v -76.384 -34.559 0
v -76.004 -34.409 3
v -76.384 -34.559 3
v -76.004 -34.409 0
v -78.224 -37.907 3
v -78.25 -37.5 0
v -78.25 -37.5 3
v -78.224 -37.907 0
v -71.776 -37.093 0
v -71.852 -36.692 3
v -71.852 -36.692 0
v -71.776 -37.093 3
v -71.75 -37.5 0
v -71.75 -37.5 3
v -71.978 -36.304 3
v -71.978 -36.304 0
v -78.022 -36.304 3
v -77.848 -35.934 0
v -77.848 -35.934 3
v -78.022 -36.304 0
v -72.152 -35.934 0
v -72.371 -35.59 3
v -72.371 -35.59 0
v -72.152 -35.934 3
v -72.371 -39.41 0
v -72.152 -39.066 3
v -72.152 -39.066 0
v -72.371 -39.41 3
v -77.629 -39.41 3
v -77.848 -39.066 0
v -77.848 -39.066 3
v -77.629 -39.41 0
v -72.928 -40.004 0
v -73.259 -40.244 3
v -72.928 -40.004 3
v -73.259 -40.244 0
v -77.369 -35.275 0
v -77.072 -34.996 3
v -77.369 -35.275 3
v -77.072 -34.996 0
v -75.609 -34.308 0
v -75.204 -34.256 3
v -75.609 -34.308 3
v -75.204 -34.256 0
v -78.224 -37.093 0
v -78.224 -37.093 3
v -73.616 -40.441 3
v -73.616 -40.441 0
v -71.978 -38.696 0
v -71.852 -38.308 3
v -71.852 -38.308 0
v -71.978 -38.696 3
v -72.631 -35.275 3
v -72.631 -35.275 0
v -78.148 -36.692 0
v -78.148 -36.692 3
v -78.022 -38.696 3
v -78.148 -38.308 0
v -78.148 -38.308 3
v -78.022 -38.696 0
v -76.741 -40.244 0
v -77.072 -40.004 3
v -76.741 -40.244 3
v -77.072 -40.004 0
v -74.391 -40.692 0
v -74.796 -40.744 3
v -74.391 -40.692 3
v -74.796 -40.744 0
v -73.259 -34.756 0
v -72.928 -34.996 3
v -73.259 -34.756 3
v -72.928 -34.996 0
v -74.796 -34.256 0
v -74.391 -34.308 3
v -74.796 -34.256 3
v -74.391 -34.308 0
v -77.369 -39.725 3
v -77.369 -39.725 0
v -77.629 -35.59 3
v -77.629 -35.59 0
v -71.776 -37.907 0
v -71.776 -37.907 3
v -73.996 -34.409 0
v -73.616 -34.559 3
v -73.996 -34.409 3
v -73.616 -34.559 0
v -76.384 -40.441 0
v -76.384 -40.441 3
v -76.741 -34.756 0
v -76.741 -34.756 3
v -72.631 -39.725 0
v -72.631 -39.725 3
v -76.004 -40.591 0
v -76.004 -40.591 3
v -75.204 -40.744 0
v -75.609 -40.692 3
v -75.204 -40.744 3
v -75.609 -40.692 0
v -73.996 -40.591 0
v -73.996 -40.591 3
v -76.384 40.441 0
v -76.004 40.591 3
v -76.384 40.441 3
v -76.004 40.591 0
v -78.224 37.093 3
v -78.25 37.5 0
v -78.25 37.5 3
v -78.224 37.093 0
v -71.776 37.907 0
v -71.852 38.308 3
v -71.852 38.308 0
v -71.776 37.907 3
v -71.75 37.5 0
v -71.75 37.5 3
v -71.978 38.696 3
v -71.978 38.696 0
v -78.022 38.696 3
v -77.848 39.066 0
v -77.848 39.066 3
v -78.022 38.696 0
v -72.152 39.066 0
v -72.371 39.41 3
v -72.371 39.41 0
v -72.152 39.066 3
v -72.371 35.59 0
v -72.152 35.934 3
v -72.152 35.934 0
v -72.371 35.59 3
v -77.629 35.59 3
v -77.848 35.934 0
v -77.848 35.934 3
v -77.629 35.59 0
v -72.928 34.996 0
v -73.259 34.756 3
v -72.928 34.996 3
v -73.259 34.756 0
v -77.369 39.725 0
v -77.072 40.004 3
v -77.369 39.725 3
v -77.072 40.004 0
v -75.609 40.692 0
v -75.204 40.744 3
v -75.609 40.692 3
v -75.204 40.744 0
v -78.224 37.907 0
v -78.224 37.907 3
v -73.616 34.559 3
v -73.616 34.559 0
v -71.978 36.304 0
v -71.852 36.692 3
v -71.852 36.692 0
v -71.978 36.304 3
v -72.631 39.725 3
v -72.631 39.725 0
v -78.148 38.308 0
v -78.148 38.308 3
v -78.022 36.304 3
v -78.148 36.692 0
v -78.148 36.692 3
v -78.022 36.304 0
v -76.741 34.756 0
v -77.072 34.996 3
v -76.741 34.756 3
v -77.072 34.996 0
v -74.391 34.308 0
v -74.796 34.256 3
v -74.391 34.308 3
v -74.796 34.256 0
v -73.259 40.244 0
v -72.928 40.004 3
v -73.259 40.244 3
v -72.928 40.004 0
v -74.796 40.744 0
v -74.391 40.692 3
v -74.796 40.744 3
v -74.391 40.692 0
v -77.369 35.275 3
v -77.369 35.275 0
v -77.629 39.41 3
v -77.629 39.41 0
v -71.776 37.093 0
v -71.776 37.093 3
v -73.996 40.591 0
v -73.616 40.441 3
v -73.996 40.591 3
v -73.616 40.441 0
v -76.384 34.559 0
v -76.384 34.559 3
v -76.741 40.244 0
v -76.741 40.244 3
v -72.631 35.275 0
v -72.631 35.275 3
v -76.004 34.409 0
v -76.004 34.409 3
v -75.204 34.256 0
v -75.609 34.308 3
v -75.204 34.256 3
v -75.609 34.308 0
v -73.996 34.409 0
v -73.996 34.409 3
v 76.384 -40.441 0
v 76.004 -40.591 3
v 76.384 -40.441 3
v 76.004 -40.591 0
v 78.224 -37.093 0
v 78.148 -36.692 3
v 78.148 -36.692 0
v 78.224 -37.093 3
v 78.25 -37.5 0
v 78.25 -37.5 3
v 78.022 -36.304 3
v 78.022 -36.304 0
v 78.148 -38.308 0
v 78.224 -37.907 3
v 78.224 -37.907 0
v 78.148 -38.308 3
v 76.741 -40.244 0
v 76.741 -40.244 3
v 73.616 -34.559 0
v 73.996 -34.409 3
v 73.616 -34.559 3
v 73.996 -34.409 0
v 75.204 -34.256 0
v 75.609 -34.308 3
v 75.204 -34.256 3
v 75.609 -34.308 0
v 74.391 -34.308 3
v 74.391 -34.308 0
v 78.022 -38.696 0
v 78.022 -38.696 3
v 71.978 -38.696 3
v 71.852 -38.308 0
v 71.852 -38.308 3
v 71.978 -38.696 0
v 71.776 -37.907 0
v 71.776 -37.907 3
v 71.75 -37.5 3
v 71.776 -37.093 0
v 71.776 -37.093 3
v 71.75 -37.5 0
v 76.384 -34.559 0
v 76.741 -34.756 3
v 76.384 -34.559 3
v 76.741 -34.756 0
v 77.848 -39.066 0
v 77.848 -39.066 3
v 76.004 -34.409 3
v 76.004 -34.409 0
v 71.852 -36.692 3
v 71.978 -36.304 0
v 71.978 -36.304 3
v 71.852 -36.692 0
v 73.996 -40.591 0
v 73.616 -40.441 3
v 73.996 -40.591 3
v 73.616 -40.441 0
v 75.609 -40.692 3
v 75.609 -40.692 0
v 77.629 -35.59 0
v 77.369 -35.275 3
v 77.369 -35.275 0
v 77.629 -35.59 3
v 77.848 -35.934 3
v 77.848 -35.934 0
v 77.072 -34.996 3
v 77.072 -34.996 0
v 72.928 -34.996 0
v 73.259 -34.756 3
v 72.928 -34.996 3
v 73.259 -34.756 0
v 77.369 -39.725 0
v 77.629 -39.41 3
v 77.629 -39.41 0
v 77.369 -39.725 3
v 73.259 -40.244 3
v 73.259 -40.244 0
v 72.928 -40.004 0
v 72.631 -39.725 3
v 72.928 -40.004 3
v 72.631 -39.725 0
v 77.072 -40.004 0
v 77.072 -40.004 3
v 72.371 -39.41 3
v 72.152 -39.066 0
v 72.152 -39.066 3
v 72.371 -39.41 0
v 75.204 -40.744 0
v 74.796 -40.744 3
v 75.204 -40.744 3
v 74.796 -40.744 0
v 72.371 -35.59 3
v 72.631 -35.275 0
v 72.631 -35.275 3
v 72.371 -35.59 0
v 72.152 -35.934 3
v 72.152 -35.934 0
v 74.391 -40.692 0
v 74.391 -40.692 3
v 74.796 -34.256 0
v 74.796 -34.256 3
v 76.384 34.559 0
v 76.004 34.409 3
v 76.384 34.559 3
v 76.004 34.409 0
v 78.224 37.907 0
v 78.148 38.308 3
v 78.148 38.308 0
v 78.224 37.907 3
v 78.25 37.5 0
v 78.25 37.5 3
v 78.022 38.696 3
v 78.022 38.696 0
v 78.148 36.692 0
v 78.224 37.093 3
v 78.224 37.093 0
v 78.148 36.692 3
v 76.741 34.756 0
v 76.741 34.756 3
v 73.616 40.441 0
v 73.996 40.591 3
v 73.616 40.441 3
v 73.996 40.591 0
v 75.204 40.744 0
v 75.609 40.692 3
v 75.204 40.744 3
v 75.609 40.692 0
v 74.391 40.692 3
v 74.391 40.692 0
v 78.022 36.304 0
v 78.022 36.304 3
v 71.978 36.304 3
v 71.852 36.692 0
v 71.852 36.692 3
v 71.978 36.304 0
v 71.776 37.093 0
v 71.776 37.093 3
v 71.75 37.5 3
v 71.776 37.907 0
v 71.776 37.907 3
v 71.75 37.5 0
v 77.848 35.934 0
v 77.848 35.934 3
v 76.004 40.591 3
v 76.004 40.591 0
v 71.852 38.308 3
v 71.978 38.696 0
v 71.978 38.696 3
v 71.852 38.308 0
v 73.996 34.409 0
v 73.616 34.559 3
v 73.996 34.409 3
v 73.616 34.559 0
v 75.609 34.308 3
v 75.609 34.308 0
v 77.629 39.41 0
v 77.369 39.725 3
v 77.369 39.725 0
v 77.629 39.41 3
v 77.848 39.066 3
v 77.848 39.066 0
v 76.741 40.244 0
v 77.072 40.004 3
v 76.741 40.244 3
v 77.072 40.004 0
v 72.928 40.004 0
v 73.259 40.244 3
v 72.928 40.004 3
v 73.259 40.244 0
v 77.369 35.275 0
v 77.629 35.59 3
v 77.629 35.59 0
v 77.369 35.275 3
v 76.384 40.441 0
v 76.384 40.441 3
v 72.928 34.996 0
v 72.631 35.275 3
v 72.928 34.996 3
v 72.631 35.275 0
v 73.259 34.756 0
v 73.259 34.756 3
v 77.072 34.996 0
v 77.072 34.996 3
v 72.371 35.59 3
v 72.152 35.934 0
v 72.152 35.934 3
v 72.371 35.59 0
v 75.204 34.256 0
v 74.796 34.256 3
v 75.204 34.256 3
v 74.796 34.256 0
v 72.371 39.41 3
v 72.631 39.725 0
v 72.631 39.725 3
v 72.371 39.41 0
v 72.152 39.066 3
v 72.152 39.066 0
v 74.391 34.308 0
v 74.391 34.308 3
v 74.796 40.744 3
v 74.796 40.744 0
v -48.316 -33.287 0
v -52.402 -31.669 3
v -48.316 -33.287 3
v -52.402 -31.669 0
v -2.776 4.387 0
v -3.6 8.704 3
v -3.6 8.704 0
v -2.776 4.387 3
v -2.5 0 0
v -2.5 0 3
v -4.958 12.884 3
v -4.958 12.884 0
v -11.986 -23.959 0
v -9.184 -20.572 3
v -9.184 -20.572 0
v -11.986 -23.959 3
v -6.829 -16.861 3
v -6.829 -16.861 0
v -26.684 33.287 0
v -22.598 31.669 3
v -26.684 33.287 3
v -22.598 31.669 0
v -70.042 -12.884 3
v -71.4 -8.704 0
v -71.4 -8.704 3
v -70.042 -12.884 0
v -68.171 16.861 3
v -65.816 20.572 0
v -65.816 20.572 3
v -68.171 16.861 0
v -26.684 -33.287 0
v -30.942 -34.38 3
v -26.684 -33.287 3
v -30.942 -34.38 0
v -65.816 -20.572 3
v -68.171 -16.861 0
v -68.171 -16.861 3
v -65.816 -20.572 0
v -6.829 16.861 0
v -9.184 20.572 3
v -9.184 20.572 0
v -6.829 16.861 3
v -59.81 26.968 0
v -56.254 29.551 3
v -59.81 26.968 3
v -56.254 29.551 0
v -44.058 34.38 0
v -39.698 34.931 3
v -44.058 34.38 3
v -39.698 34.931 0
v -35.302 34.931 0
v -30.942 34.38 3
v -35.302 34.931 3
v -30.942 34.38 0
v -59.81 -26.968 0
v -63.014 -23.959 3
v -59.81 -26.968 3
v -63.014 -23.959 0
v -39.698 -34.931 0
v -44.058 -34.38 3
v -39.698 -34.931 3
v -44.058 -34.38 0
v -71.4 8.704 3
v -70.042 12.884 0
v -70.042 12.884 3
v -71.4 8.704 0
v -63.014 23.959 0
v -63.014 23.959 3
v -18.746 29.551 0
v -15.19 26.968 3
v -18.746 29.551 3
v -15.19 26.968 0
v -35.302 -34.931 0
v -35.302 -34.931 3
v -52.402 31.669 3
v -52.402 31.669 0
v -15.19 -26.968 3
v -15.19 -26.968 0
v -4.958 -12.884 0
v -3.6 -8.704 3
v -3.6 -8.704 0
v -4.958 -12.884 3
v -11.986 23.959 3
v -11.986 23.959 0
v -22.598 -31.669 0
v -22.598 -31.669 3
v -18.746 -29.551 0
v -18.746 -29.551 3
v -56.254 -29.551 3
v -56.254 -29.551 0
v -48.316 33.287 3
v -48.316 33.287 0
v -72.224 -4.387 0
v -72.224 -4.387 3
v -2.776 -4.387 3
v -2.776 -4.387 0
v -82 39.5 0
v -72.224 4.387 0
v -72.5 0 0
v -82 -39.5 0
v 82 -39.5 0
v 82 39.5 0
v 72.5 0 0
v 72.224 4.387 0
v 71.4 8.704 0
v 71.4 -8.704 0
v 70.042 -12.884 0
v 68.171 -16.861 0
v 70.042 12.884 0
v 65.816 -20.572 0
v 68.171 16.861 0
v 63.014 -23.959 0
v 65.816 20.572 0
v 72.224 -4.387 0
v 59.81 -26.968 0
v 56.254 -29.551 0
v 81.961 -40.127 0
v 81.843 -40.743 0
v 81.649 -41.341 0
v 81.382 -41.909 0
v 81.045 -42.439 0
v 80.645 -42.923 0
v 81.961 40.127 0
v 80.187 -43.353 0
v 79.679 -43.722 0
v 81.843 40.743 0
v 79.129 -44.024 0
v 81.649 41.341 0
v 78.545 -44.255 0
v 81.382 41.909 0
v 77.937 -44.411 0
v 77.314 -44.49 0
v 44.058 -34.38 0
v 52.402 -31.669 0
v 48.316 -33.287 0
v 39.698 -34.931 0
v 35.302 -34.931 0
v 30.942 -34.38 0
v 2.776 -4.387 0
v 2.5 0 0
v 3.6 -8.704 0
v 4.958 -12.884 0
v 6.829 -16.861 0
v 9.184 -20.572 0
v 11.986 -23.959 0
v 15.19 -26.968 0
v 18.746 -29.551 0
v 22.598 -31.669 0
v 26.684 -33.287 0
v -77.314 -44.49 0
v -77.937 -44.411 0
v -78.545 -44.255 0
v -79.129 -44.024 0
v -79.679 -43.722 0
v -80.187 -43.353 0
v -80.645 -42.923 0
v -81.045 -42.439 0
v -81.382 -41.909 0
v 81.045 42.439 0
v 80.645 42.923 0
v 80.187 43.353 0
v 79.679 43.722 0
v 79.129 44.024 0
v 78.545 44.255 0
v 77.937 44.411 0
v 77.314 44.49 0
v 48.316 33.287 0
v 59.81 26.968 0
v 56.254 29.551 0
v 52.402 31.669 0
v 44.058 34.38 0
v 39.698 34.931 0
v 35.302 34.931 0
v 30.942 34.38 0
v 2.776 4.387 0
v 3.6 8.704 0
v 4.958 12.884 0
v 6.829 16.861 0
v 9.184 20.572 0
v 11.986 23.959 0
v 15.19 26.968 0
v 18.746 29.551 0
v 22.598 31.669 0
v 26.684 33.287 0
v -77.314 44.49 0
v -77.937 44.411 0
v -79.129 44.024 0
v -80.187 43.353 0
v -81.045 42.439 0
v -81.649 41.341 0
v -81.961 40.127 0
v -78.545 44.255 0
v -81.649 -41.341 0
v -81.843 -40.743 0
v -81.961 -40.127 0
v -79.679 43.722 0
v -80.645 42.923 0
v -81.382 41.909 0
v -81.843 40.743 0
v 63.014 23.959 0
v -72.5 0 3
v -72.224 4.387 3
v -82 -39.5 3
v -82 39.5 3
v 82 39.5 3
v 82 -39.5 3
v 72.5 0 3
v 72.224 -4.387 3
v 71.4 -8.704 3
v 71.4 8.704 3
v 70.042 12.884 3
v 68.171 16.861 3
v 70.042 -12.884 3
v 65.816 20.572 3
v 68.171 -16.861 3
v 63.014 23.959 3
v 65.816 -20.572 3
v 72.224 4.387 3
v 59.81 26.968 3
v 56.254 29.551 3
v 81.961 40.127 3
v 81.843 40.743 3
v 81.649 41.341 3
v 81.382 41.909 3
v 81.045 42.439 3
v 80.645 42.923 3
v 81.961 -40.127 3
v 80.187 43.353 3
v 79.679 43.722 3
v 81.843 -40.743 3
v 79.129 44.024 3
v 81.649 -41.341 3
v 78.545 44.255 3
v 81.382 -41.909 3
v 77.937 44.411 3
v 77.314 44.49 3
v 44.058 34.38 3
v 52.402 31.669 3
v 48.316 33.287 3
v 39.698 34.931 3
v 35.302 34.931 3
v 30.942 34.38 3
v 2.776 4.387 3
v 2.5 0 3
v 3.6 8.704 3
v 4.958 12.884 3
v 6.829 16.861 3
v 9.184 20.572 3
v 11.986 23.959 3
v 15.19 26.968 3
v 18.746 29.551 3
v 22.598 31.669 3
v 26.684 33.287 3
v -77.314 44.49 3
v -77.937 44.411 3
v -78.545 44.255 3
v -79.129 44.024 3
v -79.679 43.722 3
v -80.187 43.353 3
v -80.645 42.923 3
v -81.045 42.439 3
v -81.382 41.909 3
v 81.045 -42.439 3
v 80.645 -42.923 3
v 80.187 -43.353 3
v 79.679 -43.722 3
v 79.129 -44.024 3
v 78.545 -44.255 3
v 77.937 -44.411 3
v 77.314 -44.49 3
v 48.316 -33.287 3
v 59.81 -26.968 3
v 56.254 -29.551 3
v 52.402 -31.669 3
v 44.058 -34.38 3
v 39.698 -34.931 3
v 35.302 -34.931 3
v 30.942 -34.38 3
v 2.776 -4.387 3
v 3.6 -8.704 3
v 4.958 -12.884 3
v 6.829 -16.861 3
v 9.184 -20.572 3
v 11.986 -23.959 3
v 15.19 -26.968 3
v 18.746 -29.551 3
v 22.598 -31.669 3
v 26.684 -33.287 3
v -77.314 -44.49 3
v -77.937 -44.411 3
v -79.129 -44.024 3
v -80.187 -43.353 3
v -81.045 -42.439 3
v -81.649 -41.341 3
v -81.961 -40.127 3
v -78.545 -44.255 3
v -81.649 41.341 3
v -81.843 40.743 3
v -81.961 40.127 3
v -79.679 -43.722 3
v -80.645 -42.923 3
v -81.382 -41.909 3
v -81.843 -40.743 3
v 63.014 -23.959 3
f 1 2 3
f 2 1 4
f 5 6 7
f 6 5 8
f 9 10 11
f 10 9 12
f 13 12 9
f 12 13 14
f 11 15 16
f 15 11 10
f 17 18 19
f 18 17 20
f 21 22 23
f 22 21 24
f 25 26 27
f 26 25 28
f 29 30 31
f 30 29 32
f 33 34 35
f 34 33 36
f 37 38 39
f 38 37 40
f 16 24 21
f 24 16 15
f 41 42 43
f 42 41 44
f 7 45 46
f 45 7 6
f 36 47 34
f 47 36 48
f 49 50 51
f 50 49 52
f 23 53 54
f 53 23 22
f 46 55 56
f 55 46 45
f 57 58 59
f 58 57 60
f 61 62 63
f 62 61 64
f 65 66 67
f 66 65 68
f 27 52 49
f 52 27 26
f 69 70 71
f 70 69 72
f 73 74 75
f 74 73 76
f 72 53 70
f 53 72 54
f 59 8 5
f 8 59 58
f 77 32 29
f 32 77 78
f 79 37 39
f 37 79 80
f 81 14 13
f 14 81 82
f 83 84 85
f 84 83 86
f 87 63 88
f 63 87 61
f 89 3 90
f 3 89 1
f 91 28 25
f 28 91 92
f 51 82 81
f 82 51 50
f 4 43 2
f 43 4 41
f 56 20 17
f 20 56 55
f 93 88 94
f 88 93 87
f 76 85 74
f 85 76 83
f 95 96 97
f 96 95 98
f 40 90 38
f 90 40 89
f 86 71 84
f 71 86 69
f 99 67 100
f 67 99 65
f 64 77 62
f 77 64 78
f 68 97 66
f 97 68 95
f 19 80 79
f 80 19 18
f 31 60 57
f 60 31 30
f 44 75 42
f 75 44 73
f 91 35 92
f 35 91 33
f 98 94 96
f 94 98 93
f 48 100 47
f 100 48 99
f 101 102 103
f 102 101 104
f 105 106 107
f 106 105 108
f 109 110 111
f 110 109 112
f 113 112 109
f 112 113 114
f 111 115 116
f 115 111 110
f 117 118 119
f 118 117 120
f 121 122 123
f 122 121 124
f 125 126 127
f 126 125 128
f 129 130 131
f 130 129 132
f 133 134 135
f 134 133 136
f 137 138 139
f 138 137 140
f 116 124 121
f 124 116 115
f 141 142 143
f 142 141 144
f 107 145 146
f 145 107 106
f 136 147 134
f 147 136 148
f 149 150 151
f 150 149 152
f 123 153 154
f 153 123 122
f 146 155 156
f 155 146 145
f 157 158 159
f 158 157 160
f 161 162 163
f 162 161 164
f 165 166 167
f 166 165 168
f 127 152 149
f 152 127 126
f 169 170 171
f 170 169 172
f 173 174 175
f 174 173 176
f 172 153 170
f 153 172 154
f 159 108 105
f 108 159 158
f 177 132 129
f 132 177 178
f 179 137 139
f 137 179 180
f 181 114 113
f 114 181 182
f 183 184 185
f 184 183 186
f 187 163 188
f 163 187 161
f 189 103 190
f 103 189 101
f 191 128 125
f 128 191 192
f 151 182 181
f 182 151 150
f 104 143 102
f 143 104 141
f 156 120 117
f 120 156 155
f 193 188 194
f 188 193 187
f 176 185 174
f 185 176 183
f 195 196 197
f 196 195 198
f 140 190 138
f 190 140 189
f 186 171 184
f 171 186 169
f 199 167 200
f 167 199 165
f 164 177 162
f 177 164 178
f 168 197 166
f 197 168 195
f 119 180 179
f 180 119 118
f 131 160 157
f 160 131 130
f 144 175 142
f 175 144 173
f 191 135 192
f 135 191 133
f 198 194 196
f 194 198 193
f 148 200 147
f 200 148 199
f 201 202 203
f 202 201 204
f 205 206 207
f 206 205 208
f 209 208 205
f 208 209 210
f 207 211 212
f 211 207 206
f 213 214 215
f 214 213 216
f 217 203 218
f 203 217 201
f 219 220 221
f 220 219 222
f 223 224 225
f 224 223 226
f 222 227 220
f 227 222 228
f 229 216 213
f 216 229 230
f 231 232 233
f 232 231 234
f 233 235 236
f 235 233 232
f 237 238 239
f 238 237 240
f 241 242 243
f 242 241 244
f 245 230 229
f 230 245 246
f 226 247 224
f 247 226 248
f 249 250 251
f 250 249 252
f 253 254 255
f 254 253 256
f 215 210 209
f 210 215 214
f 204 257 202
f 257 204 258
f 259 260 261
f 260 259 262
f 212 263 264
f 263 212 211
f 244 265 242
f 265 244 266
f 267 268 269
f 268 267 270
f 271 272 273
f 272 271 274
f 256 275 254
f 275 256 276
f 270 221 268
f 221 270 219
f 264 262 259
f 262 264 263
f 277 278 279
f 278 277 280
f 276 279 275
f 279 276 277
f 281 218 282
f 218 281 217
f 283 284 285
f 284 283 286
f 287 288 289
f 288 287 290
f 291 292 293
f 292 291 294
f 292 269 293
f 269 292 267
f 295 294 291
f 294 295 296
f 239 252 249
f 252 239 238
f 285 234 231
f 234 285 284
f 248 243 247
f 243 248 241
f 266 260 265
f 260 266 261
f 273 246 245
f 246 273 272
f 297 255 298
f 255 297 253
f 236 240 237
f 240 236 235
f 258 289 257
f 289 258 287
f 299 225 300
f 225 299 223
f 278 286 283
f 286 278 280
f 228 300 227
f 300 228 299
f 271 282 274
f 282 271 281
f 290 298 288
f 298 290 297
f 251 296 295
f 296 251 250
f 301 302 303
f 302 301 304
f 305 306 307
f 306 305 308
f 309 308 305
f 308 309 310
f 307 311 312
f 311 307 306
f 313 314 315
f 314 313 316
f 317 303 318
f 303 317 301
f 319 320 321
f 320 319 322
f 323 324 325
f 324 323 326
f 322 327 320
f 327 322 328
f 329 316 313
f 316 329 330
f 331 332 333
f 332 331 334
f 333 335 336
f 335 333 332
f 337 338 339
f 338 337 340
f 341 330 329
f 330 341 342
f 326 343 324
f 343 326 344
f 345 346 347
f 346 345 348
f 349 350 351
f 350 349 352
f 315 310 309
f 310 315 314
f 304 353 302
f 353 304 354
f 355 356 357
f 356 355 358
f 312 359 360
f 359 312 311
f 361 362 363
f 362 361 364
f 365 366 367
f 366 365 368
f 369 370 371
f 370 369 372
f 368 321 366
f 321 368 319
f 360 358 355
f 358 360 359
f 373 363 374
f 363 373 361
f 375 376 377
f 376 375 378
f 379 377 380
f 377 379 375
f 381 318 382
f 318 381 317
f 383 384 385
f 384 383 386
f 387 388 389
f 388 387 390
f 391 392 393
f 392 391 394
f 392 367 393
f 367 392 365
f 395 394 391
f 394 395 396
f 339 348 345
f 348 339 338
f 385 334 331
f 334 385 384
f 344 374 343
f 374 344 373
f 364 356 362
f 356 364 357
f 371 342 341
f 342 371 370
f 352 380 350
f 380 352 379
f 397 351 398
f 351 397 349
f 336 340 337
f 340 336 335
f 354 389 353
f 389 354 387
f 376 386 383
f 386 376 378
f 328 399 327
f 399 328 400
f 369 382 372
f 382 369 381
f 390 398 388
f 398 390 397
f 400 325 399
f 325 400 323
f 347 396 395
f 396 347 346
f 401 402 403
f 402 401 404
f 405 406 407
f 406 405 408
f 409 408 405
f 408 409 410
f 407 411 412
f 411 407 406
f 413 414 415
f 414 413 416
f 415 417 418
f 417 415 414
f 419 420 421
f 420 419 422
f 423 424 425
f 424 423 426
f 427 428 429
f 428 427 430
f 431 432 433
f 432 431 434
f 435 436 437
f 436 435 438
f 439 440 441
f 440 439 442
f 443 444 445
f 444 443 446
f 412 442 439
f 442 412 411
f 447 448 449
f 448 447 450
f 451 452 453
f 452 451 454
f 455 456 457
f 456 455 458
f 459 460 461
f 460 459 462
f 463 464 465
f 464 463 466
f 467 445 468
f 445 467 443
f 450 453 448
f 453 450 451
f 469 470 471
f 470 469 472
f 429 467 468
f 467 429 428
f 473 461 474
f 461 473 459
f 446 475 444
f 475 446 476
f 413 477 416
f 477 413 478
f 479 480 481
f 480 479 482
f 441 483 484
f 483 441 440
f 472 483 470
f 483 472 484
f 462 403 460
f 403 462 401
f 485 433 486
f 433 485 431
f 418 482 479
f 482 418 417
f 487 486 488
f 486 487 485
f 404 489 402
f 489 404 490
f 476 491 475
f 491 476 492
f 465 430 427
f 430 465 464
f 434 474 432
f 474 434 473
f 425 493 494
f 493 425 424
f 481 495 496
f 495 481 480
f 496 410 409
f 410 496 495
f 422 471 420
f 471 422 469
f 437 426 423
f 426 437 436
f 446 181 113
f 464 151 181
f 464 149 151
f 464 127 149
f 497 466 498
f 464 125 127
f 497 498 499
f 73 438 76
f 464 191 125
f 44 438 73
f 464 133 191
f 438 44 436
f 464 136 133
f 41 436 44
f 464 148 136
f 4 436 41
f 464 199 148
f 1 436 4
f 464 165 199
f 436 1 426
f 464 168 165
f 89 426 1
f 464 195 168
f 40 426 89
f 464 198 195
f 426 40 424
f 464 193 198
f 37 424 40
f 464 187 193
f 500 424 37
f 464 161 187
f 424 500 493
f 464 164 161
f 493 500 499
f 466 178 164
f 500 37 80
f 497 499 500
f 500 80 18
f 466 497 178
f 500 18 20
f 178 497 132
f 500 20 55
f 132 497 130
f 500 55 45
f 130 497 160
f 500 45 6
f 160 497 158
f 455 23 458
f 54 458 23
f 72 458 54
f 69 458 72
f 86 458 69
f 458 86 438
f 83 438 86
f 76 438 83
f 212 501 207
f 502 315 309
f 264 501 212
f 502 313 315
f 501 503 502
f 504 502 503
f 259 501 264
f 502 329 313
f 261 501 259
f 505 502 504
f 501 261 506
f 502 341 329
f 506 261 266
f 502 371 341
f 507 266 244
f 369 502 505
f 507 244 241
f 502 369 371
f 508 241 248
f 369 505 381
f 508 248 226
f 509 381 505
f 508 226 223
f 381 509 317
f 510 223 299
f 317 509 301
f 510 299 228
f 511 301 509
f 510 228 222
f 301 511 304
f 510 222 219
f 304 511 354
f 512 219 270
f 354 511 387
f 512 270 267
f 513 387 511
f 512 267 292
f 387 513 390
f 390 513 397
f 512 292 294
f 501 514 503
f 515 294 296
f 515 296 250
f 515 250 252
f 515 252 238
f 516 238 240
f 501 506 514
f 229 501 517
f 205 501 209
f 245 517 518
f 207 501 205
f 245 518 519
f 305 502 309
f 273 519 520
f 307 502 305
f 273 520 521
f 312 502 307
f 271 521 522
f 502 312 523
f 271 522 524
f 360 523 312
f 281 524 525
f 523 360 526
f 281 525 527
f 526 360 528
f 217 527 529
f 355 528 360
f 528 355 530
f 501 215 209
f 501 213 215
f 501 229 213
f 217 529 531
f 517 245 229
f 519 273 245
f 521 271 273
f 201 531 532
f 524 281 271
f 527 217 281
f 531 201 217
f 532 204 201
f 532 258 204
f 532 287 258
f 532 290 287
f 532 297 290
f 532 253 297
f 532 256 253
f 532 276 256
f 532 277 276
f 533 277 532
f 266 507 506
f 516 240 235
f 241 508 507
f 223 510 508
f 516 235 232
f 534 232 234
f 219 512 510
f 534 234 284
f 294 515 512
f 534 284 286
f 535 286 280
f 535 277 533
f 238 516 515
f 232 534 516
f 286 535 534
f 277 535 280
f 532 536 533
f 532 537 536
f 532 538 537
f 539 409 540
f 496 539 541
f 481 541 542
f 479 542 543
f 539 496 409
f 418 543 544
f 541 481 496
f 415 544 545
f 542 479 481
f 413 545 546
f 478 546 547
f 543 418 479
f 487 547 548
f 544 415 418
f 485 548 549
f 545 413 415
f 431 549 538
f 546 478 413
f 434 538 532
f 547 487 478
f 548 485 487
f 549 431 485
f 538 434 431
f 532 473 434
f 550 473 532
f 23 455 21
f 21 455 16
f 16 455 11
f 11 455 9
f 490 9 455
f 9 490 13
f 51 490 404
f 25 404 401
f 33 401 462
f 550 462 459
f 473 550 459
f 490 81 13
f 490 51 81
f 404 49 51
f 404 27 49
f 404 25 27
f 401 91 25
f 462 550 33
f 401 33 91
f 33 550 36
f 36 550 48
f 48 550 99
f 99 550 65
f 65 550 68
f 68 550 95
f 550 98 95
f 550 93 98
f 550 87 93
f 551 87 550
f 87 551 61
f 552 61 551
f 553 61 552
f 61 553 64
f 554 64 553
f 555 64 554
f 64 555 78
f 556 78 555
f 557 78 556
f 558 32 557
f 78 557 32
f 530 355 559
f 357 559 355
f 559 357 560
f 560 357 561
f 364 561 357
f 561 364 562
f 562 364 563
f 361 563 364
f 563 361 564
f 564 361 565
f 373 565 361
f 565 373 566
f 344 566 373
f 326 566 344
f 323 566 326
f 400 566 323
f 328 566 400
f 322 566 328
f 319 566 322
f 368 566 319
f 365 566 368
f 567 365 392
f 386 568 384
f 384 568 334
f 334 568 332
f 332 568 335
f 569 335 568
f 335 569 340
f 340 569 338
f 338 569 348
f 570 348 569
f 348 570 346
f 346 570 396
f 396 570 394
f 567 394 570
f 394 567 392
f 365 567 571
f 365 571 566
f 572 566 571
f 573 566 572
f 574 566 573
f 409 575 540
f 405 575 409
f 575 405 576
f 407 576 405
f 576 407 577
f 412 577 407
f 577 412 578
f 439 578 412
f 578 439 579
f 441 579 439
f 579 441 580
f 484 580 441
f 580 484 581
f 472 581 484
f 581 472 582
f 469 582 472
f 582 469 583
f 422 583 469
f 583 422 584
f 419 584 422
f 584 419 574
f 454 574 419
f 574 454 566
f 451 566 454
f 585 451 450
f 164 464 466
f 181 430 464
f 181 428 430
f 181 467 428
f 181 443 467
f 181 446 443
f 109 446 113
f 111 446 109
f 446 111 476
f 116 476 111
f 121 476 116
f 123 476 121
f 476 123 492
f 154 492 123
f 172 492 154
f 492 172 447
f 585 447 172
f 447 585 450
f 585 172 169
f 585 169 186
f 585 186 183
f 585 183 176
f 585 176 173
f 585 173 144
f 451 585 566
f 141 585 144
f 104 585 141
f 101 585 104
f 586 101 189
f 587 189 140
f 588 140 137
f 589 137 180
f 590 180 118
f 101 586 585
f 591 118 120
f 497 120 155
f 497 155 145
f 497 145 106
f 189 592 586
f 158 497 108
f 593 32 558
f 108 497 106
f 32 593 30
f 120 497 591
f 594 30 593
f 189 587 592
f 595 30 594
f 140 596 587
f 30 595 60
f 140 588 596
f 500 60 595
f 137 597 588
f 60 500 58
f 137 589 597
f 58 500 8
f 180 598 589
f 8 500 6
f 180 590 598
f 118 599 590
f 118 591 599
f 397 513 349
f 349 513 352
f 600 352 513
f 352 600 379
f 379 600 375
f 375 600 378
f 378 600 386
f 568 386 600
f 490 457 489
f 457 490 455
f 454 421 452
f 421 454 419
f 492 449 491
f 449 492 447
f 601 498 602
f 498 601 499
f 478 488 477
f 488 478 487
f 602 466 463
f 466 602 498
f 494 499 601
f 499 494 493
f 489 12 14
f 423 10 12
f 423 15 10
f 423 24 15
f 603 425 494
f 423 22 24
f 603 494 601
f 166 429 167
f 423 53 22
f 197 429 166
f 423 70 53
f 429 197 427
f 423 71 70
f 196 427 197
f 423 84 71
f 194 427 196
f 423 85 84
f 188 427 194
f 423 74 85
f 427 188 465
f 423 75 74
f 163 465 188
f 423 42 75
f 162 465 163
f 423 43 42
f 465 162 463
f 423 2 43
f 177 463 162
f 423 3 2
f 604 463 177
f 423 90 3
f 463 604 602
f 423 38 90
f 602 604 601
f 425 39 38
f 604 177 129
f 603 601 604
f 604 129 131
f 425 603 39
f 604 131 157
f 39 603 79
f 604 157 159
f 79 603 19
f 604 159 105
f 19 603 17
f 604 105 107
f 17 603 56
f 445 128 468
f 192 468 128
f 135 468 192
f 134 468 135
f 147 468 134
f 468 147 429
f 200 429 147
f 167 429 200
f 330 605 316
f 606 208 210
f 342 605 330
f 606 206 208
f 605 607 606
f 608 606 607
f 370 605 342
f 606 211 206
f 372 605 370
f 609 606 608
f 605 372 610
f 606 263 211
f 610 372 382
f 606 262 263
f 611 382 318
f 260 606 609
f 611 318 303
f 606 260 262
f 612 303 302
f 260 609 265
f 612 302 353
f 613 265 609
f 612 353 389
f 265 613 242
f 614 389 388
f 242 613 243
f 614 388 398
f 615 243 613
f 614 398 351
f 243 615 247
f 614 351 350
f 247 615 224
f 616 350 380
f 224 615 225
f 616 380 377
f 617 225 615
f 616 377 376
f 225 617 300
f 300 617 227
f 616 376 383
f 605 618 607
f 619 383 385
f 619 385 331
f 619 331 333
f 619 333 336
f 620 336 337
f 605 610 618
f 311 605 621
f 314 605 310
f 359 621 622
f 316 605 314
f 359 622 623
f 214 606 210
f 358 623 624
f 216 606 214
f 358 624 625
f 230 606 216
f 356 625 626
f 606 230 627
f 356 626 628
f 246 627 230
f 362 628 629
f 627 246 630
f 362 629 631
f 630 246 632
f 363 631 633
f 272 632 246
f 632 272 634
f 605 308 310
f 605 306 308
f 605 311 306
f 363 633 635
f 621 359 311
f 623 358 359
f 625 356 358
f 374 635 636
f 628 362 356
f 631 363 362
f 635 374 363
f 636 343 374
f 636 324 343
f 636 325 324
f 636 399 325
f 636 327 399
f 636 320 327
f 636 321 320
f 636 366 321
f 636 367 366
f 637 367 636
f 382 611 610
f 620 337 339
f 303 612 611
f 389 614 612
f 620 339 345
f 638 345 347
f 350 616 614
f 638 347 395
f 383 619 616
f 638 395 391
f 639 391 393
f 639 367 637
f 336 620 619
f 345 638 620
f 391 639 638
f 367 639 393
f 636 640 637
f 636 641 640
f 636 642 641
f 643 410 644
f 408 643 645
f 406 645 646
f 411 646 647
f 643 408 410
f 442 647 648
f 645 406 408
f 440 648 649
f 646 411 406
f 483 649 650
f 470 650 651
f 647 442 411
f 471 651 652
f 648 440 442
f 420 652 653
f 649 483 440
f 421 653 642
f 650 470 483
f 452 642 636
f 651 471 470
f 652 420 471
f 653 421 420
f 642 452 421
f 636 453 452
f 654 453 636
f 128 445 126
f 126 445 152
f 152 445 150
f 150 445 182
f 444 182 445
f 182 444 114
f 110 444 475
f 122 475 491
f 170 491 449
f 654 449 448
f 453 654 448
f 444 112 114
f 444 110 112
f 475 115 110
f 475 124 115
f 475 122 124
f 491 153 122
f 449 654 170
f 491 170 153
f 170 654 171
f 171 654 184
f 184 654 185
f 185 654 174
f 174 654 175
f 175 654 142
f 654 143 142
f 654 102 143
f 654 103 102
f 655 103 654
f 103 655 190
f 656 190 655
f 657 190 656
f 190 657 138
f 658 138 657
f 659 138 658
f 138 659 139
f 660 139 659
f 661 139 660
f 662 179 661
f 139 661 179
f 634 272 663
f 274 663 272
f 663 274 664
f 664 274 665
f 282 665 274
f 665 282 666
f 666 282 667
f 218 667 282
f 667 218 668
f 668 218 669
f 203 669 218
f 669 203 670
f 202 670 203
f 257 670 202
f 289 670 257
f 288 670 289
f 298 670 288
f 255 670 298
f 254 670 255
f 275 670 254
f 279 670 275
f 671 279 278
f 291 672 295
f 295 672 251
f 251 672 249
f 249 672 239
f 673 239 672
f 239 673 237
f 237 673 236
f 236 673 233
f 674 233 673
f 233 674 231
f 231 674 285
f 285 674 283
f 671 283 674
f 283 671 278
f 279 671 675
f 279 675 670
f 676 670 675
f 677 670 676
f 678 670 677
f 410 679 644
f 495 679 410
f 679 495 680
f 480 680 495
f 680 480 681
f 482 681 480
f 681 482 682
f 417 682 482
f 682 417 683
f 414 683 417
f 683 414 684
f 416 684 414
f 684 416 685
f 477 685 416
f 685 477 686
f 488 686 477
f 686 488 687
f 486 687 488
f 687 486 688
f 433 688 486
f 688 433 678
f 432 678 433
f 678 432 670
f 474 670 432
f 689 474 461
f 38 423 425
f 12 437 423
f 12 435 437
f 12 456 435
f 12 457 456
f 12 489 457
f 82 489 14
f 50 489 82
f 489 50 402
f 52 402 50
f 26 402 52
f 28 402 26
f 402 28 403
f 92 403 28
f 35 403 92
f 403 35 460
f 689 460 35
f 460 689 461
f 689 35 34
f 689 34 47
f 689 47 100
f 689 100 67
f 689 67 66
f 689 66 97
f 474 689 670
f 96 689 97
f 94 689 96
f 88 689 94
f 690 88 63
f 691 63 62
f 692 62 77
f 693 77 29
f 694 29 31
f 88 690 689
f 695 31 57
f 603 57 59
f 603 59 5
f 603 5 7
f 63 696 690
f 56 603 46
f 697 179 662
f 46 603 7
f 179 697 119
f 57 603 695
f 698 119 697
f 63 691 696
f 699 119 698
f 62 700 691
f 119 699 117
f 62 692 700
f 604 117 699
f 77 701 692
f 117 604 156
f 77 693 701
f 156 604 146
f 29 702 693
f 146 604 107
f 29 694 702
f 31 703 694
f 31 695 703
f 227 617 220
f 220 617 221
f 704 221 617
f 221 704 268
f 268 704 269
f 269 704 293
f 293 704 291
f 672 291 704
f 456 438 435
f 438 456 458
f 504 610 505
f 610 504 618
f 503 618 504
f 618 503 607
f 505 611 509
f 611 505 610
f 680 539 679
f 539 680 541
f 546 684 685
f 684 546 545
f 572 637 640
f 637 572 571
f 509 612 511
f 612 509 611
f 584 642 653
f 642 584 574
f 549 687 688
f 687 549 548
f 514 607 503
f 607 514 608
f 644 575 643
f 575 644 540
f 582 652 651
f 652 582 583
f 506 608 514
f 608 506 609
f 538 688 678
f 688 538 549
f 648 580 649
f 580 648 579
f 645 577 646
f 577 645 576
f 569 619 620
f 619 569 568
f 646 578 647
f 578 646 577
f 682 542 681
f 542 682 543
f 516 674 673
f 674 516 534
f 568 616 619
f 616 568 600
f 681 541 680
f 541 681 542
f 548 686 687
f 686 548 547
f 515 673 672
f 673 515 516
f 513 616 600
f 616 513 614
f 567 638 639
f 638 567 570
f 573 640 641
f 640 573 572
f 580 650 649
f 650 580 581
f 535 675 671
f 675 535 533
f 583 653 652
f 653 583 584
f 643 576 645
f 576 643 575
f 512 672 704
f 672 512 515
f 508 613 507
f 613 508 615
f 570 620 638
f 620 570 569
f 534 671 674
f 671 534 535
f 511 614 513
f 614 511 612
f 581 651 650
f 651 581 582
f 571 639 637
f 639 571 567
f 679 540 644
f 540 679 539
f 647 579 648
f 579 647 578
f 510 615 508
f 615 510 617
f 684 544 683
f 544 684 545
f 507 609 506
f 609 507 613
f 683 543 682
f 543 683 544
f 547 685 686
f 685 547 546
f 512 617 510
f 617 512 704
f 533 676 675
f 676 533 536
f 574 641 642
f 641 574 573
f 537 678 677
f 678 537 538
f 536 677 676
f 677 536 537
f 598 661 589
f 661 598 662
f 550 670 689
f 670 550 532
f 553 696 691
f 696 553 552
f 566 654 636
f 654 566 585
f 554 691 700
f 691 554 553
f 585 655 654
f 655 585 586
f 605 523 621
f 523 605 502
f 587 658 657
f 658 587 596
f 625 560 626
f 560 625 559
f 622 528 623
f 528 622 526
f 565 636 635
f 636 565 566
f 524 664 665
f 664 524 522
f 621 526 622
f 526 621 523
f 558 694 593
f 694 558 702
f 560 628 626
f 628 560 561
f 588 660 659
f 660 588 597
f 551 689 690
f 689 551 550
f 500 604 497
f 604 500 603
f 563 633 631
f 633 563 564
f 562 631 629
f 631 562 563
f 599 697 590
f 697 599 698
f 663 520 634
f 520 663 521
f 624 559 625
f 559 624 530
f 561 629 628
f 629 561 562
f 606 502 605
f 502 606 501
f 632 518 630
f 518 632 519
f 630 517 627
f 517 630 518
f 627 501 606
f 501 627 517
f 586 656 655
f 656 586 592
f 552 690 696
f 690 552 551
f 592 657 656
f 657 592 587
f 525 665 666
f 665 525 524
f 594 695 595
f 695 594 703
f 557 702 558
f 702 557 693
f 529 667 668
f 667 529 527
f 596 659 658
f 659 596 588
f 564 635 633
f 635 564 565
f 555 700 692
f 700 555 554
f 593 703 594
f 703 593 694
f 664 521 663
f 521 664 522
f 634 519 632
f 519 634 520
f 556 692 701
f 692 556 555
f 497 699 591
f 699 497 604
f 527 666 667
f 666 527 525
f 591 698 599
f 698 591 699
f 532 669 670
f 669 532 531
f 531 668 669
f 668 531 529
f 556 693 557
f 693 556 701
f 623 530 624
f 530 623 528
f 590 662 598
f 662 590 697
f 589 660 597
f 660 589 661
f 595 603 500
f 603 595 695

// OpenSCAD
$fn = 50;

difference() {
	union() {
		hull() {
			translate(v = [-77.0, 39.5, 0]) {
				cylinder(h = 3, r = 5);
			}
			translate(v = [77.0, 39.5, 0]) {
				cylinder(h = 3, r = 5);
			}
			translate(v = [-77.0, -39.5, 0]) {
				cylinder(h = 3, r = 5);
			}
			translate(v = [77.0, -39.5, 0]) {
				cylinder(h = 3, r = 5);
			}
		}
	}
	union() {
		translate(v = [-75.0, -37.5, -100.0]) {
			cylinder(h = 200, r = 3.25);
		}
		translate(v = [-75.0, 37.5, -100.0]) {
			cylinder(h = 200, r = 3.25);
		}
		translate(v = [75.0, -37.5, -100.0]) {
			cylinder(h = 200, r = 3.25);
		}
		translate(v = [75.0, 37.5, -100.0]) {
			cylinder(h = 200, r = 3.25);
		}
		translate(v = [-75.0, -37.5, -100.0]) {
			cylinder(h = 200, r = 1.8);
		}
		translate(v = [-75.0, 37.5, -100.0]) {
			cylinder(h = 200, r = 1.8);
		}
		translate(v = [75.0, -37.5, -100.0]) {
			cylinder(h = 200, r = 1.8);
		}
		translate(v = [75.0, 37.5, -100.0]) {
			cylinder(h = 200, r = 1.8);
		}
		translate(v = [-37.5, 0, 0.0]) {
			cylinder(h = 3, r = 35.0);
		}
		translate(v = [37.5, 0, 0.0]) {
			cylinder(h = 3, r = 35.0);
		}
	}
}
